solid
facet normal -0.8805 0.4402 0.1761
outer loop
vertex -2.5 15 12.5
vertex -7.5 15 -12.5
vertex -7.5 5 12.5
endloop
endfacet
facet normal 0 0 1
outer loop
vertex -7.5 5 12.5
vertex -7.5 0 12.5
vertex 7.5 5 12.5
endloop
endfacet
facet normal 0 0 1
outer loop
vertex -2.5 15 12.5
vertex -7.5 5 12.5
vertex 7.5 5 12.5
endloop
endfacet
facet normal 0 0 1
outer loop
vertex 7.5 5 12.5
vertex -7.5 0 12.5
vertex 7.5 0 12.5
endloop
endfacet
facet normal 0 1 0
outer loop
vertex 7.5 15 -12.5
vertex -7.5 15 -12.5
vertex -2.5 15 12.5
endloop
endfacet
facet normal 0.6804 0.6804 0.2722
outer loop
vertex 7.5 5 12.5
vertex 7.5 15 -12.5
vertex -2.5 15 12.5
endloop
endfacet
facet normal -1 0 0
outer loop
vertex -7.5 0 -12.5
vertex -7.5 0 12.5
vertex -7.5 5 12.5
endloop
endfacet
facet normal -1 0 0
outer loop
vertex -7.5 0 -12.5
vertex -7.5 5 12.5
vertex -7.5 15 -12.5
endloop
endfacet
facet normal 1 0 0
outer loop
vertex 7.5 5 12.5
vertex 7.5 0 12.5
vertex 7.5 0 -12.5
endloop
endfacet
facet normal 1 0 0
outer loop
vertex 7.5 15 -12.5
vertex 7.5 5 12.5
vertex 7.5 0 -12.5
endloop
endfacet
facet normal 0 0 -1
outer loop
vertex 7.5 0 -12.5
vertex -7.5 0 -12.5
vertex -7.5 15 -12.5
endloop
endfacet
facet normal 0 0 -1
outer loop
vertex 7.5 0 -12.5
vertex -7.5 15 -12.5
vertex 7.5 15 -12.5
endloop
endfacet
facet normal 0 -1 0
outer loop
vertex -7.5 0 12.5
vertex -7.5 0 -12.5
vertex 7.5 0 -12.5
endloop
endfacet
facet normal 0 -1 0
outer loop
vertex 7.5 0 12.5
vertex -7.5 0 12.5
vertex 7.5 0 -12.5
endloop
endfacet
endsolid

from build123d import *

# Parameters (mm, degrees)
SKETCH_1_W          = 15
SKETCH_1_H          = 25
EXTRUDE_1_DEPTH     = 15
SKETCH_4_W          = 33.460320445
SKETCH_4_H          = 26.687965621
CUT_EXTRUDE_1_DEPTH = 15
SKETCH_5_W          = 41.021028331
SKETCH_5_H          = 23.23593172
CUT_EXTRUDE_2_DEPTH = 15


with BuildPart() as part:
    # 草圖1 → 填料-伸長1 (new body)
    with BuildSketch(Plane(origin=(0, 0, 0), x_dir=(1, 0, 0), z_dir=(0, 1, 0))):
        Rectangle(SKETCH_1_W, SKETCH_1_H)
    extrude(amount=EXTRUDE_1_DEPTH)

    # 草圖4 → 除料-伸長1 (cut)
    with BuildSketch(Plane(origin=(-9.689922481, 4.84496124, 1.937984496), x_dir=(0.157499846, -0.078749923, 0.984374039), z_dir=(-0.880450906, 0.440225453, 0.176090181))):
        with Locations((1.566467167, 5.33065366)):
            Rectangle(SKETCH_4_W, SKETCH_4_H)
    extrude(amount=CUT_EXTRUDE_1_DEPTH, mode=Mode.SUBTRACT)

    # 草圖5 → 除料-伸長2 (cut)
    with BuildSketch(Plane(origin=(8.101851852, 8.101851852, 3.240740741), x_dir=(-0.19245009, -0.19245009, 0.962250449), z_dir=(-0.680413817, -0.680413817, -0.272165527))):
        with Locations((-1.846019689, 5.465840721)):
            Rectangle(SKETCH_5_W, SKETCH_5_H)
    extrude(amount=-CUT_EXTRUDE_2_DEPTH, mode=Mode.SUBTRACT)


solid = part.part
